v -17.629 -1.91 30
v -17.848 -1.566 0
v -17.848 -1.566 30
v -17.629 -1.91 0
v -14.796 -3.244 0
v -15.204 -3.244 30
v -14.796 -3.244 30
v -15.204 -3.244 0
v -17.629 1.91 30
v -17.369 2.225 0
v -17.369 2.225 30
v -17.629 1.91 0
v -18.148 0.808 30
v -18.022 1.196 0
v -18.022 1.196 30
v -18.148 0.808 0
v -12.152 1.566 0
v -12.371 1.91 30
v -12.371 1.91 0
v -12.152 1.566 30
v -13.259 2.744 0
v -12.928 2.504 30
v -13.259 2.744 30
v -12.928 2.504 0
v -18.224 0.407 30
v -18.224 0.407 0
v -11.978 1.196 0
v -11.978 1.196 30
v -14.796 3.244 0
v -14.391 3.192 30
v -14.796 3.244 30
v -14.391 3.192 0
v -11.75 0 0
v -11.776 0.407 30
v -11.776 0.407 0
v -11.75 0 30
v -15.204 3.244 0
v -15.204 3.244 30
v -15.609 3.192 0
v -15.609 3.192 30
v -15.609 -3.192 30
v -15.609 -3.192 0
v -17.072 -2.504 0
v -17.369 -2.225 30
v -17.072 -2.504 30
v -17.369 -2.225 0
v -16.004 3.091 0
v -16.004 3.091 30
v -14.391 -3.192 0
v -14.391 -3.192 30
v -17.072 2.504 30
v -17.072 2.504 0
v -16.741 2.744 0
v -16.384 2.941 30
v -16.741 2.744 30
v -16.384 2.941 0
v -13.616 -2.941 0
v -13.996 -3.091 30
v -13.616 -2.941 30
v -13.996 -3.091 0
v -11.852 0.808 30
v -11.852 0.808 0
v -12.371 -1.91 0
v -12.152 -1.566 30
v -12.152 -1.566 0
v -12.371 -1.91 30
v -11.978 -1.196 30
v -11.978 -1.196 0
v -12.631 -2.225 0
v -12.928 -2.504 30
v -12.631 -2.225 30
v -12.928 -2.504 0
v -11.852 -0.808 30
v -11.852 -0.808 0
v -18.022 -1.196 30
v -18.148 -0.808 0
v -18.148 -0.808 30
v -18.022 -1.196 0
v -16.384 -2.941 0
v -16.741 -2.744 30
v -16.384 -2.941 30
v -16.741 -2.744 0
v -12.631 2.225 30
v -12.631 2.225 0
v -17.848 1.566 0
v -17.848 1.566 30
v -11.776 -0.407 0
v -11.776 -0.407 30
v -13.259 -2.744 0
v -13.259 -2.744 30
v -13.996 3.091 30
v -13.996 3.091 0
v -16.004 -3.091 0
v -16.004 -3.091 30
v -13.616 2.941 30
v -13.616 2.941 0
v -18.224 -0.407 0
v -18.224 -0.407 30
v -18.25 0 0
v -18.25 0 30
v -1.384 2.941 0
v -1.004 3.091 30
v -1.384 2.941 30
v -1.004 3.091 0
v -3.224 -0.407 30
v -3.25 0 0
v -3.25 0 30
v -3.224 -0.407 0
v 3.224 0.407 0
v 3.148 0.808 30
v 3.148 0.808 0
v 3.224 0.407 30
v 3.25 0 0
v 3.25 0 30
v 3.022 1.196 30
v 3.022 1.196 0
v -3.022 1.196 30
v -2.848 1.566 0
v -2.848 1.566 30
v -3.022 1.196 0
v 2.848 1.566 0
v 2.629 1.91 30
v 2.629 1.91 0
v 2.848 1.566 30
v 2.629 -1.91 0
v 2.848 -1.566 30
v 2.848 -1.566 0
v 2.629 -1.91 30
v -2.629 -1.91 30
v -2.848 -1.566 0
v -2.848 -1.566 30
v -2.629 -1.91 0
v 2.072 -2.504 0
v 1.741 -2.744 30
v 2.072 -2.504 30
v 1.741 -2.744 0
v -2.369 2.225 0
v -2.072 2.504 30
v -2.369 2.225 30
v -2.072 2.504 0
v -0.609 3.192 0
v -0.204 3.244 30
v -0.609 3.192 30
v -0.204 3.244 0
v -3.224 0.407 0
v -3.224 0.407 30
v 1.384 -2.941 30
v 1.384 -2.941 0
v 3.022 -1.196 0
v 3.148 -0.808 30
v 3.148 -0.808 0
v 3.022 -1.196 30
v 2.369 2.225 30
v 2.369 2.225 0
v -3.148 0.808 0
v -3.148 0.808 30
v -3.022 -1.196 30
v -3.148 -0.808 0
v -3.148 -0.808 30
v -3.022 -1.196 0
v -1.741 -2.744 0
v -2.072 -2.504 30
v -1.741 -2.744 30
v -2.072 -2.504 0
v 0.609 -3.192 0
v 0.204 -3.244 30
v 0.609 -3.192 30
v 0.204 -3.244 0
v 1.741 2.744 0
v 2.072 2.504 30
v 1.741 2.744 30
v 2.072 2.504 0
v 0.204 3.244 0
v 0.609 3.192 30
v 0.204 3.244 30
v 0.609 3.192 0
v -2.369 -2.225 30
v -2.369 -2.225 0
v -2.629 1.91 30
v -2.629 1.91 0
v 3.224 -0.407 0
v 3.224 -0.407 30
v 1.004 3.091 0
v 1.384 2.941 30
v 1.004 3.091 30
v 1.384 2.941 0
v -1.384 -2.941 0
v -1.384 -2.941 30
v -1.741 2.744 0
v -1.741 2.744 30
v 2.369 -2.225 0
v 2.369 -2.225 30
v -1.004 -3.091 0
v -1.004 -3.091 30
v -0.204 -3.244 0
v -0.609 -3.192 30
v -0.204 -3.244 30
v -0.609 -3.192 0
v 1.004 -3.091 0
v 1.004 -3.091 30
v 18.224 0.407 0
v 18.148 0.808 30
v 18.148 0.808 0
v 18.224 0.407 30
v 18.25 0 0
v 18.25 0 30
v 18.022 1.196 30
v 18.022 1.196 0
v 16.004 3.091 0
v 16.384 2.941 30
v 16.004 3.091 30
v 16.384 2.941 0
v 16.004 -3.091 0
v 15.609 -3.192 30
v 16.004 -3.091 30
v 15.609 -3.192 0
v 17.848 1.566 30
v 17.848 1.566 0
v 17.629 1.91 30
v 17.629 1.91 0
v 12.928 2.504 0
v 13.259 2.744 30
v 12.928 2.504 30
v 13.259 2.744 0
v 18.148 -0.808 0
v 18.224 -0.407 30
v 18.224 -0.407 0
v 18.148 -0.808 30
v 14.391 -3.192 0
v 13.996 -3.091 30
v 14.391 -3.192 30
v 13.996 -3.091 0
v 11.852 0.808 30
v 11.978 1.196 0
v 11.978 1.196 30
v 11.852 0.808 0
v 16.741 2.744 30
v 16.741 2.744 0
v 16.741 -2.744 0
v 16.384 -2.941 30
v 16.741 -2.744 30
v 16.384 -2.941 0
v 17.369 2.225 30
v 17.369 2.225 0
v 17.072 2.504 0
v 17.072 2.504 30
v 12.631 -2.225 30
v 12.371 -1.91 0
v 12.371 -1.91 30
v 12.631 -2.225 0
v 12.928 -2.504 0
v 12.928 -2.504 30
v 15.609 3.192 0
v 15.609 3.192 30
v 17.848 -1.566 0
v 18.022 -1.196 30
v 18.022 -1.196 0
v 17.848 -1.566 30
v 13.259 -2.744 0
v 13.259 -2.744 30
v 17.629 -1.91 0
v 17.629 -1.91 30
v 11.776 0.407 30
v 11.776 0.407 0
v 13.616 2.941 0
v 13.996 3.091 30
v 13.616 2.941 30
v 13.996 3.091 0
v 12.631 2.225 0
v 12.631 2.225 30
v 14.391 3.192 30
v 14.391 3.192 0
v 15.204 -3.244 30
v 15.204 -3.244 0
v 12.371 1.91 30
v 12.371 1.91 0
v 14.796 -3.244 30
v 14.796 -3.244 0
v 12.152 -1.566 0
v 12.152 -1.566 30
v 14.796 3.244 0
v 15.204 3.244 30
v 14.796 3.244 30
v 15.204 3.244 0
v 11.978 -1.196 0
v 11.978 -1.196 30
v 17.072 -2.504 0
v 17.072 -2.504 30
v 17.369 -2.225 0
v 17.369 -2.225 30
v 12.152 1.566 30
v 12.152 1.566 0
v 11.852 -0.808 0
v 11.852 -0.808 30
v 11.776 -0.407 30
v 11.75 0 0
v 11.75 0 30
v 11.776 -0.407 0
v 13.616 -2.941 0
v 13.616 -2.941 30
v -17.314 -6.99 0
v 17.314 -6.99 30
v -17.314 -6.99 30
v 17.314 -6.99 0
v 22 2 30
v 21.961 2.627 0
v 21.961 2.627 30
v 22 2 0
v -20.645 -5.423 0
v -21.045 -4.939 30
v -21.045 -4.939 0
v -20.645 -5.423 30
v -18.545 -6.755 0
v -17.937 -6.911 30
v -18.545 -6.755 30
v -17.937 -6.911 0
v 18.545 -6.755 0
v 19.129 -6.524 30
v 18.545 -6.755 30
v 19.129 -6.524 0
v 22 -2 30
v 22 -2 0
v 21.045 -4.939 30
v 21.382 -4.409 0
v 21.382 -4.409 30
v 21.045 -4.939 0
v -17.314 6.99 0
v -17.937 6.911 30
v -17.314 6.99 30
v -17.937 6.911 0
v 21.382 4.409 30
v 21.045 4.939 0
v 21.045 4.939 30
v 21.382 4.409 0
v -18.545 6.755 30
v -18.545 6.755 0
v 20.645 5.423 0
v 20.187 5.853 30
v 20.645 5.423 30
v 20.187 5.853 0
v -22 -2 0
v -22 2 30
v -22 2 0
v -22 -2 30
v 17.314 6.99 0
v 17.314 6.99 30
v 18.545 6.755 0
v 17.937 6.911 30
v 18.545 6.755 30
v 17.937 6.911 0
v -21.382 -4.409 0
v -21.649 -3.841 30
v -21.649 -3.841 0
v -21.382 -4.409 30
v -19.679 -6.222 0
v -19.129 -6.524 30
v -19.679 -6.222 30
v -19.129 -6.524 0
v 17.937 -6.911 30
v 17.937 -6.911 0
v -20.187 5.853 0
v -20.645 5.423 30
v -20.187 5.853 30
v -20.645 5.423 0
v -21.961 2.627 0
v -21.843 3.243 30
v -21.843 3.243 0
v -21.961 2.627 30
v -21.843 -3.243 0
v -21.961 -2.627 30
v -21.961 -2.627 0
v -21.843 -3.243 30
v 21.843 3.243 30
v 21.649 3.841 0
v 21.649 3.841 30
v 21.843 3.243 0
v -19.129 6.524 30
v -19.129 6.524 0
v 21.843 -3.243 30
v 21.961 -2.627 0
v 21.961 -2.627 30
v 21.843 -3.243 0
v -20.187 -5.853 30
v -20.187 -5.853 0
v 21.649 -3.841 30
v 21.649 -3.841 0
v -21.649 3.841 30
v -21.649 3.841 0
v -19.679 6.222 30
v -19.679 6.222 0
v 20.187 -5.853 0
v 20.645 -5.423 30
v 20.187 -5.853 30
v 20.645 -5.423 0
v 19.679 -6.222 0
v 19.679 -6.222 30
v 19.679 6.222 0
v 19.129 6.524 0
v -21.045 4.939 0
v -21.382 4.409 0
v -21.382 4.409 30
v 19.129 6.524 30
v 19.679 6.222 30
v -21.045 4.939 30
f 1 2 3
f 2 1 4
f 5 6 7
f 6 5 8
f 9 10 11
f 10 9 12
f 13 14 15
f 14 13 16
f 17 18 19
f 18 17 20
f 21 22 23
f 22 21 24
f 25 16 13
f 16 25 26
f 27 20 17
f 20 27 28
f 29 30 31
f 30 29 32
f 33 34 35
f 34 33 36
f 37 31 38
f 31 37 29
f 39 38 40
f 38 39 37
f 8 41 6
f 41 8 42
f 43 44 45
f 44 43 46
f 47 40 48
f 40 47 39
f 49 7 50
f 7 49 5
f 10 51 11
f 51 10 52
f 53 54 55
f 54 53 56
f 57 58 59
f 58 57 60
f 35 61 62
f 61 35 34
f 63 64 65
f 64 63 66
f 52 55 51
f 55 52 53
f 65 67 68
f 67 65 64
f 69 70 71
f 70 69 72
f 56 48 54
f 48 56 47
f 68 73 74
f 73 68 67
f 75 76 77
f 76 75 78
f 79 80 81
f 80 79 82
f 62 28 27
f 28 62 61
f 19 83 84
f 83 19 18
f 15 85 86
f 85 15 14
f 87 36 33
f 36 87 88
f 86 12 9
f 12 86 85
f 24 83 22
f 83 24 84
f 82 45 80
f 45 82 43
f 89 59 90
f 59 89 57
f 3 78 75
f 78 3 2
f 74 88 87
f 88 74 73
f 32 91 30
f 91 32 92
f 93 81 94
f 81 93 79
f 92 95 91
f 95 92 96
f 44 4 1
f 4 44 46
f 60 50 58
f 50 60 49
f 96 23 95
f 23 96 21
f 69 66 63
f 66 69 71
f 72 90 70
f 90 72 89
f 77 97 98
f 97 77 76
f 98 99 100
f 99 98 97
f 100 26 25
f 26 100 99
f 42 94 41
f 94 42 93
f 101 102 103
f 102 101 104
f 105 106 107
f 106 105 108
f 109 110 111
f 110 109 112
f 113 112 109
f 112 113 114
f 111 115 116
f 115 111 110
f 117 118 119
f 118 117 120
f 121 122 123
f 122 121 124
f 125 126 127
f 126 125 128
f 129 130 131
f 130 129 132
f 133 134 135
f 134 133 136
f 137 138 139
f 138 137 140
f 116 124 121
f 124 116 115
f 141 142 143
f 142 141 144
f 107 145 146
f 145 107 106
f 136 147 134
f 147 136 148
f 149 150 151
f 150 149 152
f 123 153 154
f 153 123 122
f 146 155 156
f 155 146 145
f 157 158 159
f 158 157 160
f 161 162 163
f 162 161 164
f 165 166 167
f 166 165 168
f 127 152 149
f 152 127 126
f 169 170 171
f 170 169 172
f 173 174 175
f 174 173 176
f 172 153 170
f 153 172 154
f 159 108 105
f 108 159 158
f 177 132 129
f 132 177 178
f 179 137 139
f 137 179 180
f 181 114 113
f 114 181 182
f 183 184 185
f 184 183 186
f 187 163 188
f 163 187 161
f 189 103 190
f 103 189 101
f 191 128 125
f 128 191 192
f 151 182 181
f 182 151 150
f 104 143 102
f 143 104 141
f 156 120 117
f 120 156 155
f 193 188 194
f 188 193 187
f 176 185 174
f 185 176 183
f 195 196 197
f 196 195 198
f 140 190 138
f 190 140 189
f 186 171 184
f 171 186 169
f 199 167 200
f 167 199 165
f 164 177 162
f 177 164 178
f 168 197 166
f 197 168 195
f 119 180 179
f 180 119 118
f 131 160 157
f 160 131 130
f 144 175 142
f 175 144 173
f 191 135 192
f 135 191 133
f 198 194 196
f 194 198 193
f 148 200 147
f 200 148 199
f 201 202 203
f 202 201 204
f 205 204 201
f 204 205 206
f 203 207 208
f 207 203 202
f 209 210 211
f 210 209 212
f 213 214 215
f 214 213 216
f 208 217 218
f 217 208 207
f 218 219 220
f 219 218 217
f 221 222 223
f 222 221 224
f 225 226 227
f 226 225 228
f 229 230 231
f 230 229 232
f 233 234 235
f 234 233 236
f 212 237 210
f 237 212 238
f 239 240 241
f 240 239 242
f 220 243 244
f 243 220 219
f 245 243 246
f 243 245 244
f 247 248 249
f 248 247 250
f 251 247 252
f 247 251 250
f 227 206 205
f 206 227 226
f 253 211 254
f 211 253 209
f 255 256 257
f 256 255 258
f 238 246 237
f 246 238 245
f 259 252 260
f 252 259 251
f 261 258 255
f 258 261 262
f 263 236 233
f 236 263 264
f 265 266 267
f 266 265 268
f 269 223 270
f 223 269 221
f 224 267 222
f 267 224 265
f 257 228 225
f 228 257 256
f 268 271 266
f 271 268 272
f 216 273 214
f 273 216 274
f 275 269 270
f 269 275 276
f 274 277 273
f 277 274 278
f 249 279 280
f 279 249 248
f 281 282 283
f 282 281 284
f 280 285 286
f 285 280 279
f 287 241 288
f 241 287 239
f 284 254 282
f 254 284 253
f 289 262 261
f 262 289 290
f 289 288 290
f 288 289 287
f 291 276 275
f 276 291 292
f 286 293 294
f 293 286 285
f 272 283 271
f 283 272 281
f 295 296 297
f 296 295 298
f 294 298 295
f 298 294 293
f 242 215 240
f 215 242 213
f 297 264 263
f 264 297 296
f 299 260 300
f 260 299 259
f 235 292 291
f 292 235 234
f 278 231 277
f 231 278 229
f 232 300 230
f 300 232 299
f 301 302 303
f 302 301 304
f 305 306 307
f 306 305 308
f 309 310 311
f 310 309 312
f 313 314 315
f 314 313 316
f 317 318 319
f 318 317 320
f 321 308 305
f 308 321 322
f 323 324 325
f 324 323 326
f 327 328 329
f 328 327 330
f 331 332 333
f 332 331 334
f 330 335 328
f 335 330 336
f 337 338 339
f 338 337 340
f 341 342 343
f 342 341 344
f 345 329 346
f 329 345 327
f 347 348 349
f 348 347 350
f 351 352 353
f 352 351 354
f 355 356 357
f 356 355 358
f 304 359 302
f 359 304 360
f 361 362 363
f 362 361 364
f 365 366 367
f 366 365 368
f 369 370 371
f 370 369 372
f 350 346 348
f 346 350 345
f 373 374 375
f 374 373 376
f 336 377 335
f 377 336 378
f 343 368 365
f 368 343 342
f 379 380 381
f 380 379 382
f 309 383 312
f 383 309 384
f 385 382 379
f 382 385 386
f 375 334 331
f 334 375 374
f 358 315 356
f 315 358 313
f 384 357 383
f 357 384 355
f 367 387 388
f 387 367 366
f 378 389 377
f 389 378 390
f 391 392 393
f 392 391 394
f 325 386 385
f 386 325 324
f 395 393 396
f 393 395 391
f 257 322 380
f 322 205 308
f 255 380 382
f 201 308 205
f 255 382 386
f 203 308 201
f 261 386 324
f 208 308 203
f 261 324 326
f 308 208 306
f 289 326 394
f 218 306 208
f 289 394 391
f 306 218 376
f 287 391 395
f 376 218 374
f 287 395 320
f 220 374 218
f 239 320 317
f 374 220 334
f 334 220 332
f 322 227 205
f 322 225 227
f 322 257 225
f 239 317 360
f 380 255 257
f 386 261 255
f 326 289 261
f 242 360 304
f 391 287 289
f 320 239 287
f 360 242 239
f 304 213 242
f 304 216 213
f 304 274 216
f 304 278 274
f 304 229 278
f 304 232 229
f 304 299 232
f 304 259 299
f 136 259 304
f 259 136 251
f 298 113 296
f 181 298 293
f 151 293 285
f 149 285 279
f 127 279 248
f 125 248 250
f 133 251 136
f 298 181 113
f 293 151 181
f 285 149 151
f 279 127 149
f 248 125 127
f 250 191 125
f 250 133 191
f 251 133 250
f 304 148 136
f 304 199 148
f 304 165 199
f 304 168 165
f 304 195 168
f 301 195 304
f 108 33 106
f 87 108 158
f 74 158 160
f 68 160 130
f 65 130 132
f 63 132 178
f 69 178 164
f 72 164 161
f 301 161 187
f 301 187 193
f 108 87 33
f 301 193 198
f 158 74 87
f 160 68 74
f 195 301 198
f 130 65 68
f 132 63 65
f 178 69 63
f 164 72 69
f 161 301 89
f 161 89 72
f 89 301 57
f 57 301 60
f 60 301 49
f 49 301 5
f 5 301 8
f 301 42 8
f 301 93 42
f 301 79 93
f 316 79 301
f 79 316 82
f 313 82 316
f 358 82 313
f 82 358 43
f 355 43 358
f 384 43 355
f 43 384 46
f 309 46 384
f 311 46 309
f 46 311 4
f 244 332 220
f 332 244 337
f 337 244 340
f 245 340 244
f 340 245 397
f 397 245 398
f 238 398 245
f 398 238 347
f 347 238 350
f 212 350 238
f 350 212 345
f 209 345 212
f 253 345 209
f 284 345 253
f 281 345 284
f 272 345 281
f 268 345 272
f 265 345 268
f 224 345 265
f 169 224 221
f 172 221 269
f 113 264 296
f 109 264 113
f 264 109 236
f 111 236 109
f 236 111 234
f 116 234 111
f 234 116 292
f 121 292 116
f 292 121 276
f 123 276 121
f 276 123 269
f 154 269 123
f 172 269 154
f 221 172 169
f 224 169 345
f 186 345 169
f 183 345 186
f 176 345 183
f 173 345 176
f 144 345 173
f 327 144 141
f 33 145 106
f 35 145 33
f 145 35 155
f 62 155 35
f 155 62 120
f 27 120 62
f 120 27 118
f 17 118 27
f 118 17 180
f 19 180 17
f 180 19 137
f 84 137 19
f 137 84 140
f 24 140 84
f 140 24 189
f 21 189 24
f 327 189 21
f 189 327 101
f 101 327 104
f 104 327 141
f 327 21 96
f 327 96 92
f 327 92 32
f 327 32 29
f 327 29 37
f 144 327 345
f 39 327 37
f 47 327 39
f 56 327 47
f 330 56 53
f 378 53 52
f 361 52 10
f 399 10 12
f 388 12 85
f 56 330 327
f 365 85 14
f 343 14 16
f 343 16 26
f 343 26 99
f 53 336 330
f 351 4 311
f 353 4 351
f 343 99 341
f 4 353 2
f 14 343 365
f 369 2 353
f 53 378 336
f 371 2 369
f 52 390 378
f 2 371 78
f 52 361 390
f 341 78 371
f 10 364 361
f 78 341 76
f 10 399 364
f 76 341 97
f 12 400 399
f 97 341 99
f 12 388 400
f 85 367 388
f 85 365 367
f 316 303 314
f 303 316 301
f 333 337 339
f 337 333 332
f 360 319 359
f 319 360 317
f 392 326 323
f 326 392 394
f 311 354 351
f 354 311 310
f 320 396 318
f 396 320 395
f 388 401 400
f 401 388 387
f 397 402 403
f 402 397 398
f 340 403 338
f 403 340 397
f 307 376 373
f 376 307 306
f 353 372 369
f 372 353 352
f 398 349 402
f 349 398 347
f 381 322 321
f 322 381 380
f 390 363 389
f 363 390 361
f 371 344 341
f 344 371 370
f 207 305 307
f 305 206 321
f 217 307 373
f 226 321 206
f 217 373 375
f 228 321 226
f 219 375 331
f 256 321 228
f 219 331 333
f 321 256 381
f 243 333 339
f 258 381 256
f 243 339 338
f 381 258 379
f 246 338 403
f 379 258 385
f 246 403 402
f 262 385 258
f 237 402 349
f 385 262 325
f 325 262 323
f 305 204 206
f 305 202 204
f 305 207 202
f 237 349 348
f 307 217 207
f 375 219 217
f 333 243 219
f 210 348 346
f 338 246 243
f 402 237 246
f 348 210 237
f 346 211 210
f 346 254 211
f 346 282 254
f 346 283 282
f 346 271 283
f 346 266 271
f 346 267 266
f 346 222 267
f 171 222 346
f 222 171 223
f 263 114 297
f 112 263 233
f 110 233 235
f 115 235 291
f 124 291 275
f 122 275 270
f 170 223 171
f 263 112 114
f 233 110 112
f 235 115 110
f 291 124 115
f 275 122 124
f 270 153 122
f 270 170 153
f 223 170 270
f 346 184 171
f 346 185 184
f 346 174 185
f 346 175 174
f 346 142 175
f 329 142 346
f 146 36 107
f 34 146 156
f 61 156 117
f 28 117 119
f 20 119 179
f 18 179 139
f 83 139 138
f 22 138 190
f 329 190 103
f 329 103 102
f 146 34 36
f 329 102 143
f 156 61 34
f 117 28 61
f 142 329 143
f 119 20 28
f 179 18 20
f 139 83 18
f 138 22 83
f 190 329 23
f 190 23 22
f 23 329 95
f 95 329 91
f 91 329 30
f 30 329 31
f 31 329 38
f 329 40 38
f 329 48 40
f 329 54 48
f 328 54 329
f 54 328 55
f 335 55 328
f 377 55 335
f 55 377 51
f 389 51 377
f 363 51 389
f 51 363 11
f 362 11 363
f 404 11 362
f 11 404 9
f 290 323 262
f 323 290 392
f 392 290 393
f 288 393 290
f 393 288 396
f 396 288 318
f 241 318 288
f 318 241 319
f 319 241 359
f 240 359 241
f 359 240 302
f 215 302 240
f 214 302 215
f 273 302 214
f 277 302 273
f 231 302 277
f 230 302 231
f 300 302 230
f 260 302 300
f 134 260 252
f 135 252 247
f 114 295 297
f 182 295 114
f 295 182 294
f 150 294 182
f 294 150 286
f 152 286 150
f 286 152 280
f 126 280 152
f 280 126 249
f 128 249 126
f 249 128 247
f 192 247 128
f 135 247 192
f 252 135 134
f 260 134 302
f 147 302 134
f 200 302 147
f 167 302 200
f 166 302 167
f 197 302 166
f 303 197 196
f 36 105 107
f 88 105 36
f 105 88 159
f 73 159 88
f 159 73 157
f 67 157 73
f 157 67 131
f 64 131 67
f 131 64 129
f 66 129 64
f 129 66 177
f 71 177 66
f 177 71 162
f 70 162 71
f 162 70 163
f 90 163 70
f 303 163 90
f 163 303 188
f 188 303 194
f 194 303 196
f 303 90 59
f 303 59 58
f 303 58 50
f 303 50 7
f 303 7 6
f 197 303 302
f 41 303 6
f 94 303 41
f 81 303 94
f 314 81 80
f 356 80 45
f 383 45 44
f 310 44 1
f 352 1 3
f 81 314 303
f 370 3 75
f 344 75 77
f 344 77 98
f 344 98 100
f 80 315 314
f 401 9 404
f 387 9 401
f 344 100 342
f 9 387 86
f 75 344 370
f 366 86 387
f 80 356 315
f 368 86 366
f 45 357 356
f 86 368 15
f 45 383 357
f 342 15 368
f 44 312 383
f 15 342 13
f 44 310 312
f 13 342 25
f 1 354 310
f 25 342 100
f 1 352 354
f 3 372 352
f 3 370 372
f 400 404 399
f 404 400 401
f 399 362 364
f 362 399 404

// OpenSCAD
$fn = 50;


difference() {
	union() {
		hull() {
			translate(v = [-17.0000000000, 2.0000000000, 0]) {
				cylinder(h = 30, r = 5);
			}
			translate(v = [17.0000000000, 2.0000000000, 0]) {
				cylinder(h = 30, r = 5);
			}
			translate(v = [-17.0000000000, -2.0000000000, 0]) {
				cylinder(h = 30, r = 5);
			}
			translate(v = [17.0000000000, -2.0000000000, 0]) {
				cylinder(h = 30, r = 5);
			}
		}
	}
	union() {
		translate(v = [-15.0000000000, 0.0000000000, -100.0000000000]) {
			cylinder(h = 200, r = 3.2500000000);
		}
		translate(v = [0.0000000000, 0.0000000000, -100.0000000000]) {
			cylinder(h = 200, r = 3.2500000000);
		}
		translate(v = [15.0000000000, 0.0000000000, -100.0000000000]) {
			cylinder(h = 200, r = 3.2500000000);
		}
	}
}
